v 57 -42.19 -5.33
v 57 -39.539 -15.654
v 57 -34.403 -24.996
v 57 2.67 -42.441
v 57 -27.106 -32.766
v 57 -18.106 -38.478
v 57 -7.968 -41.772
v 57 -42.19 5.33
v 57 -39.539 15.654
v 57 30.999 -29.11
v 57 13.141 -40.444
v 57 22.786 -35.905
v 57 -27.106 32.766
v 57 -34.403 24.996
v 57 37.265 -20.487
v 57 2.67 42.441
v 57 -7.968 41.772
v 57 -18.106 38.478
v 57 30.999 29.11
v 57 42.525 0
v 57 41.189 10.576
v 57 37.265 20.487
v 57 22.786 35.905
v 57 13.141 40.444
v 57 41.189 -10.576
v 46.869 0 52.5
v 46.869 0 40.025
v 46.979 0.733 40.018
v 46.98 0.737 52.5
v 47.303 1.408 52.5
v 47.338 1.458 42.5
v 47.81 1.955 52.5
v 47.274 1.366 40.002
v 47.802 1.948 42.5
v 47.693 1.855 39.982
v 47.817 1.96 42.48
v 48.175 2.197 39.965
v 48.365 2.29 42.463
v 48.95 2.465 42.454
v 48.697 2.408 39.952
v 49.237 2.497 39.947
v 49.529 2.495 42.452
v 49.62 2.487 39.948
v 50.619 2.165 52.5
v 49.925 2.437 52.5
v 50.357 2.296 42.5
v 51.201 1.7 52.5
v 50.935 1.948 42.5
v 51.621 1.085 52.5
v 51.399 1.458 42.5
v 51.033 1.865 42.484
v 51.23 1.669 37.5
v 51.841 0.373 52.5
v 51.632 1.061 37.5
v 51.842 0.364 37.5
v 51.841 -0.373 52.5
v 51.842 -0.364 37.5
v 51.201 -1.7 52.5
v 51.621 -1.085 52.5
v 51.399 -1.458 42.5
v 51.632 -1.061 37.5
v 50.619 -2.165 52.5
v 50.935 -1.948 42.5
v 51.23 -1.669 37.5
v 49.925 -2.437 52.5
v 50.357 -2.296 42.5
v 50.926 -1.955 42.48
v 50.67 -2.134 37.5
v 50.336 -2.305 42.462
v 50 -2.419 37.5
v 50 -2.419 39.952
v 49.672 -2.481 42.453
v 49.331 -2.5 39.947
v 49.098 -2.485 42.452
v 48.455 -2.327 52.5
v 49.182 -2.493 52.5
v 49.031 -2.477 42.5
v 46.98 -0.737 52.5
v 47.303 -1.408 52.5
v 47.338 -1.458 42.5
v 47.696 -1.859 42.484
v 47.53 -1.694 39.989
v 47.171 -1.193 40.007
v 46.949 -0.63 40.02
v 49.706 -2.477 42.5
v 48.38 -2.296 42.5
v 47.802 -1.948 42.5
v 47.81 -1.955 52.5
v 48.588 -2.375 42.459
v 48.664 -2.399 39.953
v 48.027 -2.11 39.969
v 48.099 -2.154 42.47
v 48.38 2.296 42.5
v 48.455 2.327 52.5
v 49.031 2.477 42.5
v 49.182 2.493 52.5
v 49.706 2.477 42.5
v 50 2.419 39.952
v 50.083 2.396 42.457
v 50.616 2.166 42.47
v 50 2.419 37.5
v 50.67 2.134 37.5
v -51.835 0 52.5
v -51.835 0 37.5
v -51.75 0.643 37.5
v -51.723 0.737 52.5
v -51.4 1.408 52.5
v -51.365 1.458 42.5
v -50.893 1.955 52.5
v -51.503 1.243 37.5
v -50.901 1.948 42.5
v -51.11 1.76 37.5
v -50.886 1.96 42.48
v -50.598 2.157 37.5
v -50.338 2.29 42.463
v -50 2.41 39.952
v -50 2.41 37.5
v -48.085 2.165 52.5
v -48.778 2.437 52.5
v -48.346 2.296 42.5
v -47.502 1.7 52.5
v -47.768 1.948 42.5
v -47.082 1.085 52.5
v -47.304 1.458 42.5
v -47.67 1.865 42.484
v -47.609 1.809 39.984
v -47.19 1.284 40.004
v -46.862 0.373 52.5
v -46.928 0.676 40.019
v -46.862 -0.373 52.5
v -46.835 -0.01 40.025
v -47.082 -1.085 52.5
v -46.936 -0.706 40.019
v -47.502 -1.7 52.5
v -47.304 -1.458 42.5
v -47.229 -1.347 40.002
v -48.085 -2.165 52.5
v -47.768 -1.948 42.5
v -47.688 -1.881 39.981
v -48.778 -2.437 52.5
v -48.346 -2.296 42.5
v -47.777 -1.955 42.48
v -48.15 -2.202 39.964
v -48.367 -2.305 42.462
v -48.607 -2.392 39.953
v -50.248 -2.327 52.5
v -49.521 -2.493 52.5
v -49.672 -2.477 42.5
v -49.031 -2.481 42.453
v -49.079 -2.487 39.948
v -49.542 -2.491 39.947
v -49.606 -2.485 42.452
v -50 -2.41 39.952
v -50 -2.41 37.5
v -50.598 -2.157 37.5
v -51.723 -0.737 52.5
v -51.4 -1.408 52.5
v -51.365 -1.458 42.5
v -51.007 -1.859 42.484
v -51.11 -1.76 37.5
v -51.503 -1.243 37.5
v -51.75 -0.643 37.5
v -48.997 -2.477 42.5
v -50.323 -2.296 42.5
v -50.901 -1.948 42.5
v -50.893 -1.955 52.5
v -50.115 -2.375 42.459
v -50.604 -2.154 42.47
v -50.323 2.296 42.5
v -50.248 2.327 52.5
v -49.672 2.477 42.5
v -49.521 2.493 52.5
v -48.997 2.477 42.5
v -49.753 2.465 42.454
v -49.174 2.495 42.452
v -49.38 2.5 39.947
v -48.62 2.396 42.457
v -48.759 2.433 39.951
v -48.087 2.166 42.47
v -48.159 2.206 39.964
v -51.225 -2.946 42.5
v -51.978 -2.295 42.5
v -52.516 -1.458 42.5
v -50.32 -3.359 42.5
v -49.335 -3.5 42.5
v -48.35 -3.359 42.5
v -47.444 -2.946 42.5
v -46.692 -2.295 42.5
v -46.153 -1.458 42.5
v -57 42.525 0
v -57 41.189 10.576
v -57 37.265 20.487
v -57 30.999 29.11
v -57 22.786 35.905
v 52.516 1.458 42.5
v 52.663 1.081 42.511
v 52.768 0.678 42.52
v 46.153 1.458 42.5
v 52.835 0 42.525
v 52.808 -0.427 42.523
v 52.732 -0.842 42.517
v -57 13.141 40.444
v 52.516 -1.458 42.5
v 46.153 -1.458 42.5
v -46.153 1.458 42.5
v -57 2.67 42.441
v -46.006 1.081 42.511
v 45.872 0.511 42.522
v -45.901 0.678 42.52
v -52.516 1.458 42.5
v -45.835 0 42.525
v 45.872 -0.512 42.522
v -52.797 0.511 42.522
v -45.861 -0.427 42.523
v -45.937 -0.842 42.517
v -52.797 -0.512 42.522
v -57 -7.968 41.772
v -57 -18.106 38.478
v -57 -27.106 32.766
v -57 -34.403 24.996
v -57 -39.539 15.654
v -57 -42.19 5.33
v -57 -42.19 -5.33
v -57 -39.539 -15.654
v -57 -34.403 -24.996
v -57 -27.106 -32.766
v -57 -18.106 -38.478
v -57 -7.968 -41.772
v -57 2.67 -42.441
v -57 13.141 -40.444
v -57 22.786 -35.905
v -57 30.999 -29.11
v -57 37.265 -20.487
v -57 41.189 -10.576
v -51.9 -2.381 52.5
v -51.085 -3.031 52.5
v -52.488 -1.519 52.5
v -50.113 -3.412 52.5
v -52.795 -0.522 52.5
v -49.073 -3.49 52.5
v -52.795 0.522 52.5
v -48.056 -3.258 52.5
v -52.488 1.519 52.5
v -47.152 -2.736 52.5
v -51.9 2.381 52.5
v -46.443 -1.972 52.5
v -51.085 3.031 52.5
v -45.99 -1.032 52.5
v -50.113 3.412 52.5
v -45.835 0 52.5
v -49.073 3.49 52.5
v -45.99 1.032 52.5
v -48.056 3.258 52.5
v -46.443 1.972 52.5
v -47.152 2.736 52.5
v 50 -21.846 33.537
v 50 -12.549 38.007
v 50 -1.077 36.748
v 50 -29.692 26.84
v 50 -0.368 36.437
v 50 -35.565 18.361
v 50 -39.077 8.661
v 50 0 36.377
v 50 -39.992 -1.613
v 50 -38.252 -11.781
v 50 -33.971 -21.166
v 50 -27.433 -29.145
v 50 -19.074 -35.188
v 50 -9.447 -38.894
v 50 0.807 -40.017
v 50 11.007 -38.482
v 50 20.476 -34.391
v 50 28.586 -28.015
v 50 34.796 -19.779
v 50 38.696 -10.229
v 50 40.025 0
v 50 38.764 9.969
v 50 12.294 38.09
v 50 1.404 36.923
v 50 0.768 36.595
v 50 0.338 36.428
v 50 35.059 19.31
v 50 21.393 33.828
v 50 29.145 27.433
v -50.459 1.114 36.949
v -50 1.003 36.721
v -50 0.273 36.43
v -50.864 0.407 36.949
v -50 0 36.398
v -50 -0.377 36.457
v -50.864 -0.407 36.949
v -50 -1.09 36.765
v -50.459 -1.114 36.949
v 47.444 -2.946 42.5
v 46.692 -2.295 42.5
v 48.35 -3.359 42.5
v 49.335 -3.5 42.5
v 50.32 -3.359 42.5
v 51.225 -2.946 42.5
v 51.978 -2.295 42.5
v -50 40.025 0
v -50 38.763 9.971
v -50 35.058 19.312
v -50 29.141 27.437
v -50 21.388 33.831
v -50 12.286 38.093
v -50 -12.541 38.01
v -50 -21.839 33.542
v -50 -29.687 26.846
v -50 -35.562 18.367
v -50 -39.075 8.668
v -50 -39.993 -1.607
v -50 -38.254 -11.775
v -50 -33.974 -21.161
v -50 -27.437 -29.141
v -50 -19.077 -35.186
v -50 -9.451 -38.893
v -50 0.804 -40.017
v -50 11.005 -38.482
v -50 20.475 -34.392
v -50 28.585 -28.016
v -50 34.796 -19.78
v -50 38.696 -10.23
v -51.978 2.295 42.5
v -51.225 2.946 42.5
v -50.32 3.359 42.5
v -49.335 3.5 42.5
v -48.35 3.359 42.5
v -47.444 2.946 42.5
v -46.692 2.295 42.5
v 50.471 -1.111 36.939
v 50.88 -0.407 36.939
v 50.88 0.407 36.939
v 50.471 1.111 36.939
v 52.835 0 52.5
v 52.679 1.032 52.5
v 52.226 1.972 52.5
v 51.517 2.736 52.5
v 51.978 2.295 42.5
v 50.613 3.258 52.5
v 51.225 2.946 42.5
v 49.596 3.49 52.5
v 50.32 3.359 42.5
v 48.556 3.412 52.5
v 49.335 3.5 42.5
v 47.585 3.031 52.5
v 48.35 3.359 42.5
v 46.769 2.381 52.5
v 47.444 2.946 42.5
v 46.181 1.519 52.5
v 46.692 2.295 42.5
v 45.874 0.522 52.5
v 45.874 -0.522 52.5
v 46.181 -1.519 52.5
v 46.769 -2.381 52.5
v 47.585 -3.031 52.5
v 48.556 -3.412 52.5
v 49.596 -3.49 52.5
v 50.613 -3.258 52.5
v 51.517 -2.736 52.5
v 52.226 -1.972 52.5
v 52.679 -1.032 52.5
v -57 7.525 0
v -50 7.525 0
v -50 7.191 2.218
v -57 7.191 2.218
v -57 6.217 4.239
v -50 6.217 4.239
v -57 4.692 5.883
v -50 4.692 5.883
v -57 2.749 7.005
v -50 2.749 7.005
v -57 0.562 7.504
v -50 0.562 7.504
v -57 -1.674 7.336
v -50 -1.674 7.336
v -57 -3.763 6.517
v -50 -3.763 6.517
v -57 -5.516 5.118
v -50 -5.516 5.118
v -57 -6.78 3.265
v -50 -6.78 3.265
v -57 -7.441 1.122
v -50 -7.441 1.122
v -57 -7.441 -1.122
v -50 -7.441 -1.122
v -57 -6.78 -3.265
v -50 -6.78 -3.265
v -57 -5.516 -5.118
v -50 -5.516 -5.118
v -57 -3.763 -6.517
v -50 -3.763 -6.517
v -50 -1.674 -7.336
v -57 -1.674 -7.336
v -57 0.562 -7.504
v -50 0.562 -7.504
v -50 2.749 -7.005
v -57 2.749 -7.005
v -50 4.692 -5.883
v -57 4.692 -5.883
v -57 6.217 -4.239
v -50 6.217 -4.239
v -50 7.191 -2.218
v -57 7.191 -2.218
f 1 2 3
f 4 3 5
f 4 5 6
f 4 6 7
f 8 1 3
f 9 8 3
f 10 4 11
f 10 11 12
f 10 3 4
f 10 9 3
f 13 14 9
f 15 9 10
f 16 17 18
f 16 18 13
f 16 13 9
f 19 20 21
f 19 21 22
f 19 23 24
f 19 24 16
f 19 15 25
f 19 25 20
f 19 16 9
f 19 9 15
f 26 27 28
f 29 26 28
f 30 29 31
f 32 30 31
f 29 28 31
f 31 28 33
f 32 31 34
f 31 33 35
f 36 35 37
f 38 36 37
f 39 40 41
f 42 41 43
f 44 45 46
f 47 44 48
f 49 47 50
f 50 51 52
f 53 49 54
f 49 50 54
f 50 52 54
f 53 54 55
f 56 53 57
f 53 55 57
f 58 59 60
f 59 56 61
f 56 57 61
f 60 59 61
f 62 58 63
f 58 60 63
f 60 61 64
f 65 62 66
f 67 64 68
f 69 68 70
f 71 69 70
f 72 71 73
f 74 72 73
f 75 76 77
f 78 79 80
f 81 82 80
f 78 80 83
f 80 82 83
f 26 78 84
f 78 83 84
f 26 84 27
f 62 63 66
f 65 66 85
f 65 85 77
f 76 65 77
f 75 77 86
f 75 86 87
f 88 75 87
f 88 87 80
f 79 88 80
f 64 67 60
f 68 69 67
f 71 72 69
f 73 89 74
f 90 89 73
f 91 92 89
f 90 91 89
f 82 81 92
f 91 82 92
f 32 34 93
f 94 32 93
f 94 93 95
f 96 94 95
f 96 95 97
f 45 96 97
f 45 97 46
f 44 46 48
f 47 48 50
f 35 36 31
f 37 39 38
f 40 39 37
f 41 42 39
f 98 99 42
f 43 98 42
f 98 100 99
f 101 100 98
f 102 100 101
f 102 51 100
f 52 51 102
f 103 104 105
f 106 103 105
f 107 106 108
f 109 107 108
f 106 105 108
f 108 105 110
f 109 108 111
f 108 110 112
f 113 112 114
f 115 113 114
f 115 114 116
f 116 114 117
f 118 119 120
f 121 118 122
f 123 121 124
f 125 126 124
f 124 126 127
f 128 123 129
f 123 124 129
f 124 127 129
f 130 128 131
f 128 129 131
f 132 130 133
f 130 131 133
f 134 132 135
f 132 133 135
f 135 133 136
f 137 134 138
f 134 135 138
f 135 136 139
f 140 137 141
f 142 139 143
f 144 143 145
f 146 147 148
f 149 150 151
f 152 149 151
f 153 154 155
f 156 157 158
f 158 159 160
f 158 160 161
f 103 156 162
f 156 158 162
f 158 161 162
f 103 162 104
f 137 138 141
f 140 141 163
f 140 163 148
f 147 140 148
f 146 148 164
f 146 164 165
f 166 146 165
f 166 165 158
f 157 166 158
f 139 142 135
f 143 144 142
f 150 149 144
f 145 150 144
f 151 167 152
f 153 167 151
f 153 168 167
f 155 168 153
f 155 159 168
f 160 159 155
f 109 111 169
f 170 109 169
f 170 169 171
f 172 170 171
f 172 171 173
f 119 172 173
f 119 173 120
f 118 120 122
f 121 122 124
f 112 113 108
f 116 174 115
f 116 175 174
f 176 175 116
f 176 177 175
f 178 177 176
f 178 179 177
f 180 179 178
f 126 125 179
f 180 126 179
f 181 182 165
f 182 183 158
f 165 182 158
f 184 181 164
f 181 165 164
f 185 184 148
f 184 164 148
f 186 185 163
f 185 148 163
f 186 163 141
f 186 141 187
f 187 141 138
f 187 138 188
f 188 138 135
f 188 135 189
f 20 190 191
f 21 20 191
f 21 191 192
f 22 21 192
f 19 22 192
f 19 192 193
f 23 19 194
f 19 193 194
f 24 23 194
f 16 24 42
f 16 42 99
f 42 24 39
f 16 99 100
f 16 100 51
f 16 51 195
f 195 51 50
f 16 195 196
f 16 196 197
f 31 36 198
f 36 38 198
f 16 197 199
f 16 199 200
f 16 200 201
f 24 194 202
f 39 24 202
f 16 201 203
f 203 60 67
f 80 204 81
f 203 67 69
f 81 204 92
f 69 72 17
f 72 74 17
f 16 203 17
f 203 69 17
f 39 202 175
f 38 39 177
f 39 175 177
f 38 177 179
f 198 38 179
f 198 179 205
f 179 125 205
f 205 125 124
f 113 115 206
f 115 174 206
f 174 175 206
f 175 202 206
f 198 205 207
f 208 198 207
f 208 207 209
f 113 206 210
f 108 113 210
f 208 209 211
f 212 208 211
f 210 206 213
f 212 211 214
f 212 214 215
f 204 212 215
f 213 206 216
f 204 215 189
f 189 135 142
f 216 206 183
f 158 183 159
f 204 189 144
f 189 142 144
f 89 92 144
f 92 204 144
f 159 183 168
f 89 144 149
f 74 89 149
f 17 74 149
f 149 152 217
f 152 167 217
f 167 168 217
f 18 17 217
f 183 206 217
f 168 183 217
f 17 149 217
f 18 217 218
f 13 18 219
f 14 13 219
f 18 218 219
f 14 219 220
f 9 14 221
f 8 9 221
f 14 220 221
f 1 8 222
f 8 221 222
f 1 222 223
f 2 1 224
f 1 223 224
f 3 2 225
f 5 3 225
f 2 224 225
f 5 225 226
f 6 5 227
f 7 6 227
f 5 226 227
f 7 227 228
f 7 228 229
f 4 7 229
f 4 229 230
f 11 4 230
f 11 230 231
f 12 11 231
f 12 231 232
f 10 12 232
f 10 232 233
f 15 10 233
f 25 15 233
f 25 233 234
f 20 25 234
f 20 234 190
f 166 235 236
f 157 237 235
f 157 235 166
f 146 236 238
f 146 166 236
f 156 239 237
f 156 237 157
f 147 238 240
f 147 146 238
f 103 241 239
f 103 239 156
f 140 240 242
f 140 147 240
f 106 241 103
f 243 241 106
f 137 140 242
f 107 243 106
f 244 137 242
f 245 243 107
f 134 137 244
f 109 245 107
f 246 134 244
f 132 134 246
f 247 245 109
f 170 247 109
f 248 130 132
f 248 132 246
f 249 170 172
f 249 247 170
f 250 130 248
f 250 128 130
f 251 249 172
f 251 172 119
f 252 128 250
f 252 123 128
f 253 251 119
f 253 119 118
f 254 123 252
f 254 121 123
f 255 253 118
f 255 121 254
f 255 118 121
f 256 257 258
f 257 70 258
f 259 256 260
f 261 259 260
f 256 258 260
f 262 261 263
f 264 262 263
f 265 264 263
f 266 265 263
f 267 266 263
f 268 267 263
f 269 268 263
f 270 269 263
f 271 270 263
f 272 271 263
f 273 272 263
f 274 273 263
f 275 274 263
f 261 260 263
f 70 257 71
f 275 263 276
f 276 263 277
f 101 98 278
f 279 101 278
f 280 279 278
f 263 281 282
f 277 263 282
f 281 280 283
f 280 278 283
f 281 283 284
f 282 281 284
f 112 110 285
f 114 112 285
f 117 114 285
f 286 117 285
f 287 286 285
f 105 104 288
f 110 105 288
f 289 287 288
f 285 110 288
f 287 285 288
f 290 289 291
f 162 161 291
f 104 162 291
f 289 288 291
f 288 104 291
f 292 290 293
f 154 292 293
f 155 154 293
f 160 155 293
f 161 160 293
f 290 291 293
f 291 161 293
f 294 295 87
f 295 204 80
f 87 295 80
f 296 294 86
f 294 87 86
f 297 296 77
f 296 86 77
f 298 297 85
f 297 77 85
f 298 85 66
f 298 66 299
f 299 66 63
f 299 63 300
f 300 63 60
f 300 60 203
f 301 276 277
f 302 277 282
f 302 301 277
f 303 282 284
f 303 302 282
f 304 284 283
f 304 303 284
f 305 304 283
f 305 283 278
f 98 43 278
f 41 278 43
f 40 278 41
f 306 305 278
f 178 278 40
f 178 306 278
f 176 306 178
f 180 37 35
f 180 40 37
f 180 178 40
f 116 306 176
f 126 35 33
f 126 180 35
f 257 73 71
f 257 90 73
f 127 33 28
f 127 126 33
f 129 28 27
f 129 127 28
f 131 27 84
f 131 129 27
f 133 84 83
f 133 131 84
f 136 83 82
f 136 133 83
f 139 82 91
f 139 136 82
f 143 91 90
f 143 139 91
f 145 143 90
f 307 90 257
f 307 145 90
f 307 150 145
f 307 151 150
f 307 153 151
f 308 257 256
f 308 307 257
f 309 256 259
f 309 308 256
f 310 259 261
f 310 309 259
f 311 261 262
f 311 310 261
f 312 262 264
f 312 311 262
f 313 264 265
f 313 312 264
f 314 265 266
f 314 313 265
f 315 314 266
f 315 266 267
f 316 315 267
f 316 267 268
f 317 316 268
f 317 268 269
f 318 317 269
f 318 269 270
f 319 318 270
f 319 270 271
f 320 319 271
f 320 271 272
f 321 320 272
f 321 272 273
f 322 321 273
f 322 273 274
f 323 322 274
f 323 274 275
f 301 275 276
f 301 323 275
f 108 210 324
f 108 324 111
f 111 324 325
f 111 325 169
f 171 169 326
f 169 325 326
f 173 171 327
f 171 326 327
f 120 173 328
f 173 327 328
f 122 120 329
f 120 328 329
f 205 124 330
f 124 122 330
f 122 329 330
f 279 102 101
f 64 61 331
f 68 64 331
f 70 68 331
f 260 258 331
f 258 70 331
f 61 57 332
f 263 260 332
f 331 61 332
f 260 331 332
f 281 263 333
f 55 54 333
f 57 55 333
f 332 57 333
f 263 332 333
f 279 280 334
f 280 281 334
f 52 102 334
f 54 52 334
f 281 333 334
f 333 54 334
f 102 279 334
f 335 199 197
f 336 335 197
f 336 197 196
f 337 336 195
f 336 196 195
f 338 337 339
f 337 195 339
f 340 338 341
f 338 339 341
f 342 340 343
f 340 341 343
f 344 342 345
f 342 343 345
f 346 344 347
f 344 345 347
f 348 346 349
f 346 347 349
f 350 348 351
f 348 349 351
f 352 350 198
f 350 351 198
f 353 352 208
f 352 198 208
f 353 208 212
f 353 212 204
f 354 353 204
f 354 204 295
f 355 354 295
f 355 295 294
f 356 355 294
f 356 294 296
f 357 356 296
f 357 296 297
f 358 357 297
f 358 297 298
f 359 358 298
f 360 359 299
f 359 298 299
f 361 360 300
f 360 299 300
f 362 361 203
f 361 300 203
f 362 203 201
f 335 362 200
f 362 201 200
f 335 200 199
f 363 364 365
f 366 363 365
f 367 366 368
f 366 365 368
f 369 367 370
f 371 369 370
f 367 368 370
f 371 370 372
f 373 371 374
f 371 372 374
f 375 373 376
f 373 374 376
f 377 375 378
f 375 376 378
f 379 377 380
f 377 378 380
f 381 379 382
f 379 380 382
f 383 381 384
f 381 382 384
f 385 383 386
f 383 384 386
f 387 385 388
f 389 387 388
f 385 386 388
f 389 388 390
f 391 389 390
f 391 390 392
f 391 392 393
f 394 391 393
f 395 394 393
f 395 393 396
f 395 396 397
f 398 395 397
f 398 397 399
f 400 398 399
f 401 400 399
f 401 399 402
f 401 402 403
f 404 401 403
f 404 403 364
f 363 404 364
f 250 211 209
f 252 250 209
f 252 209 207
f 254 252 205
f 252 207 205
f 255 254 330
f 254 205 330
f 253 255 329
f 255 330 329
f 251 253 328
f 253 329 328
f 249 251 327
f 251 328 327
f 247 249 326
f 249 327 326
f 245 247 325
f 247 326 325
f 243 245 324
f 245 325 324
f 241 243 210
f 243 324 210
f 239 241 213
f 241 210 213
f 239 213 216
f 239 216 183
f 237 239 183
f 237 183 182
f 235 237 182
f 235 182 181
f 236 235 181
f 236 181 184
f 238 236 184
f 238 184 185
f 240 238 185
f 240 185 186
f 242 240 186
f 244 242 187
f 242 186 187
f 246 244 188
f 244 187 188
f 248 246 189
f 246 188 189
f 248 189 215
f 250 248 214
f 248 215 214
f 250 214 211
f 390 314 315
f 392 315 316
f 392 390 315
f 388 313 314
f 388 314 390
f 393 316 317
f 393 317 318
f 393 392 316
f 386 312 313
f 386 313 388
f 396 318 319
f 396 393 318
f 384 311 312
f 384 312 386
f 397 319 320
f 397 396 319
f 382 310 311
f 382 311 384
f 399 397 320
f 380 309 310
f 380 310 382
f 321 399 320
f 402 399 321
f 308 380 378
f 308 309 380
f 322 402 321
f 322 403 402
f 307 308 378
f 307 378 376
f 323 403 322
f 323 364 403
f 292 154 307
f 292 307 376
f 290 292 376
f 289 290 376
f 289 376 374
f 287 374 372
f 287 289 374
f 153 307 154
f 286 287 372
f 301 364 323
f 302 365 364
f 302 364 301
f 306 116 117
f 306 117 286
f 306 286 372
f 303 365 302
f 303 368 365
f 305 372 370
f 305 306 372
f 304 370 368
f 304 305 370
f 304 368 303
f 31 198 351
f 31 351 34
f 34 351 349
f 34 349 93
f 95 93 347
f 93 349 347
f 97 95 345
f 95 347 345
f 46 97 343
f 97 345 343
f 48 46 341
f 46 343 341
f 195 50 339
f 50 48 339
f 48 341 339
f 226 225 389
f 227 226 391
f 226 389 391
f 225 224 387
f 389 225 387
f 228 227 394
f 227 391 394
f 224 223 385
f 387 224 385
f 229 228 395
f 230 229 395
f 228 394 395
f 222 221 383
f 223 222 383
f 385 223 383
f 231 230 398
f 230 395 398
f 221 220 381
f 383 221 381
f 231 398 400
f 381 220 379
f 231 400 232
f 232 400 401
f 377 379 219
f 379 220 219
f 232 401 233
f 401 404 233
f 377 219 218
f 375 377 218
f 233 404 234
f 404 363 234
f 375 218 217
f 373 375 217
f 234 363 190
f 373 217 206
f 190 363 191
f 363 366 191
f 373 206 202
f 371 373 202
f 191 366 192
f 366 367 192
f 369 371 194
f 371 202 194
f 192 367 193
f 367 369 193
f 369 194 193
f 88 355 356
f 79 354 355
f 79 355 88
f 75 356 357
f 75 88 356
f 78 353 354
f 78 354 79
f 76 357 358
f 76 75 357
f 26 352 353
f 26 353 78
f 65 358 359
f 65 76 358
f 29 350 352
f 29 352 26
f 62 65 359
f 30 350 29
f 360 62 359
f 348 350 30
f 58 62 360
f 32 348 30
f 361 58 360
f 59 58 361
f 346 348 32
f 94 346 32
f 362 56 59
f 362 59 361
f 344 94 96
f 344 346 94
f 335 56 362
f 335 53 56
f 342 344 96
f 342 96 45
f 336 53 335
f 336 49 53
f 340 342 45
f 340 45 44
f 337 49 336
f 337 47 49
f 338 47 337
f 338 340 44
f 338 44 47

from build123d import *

# Parameters (mm, degrees)
F0_R      = 42.525
F0_R_2    = 40.025
F1_DEPTH  = 50
F2_R      = 42.525
F3_DEPTH  = 7
F6_D      = 15.05
F6_DEPTH  = 12
F6_TIP    = 4.5214761582
F8_R      = 3.5
F9_DEPTH  = 10
F11_D     = 5
F11_DEPTH = 15
F11_TIP   = 1.5021515476


with BuildPart() as f1:
    # F0 (on Right) → F1 (new body, symmetric)
    with BuildSketch(Plane.YZ):
        Circle(F0_R)
        Circle(F0_R_2, mode=Mode.SUBTRACT)
    extrude(amount=F1_DEPTH, both=True)

    # F4: F3 across plane


with BuildPart() as f3:
    # F2 (on face) → F3 (new body)
    with BuildSketch(Plane.YZ.offset(50)):
        Circle(F2_R)
    extrude(amount=F3_DEPTH)


with BuildPart() as f1_1:
    add(f1.part)
    add(f3.part.mirror(Plane.YZ))

    # F6
    with Locations(Plane(origin=(-57, 0, 0), x_dir=(0, -1, 0), z_dir=(-1, 0, 0))):
        with Locations((0, 0)):
            Hole(F6_D / 2, depth=F6_DEPTH)
            with Locations((0, 0, -(F6_DEPTH + F6_TIP / 2))):  # 118° drill point
                Cone(0, F6_D / 2, F6_TIP, mode=Mode.SUBTRACT)


    add(f3.part)  # F9 merges F3
    # F8 (on offset) → F9 (join)
    with BuildSketch(Plane.XY.offset(42.5)):
        with Locations((-49.3345595896, 0)):
            Circle(F8_R)
        with Locations((49.3345595896, 0)):
            Circle(F8_R)
    extrude(amount=F9_DEPTH)

    # F11
    with Locations(Plane.XY.offset(52.5)):
        with Locations((-49.3345595896, 0), (49.3685118854, 0)):
            Hole(F11_D / 2, depth=F11_DEPTH)
            with Locations((0, 0, -(F11_DEPTH + F11_TIP / 2))):  # 118° drill point
                Cone(0, F11_D / 2, F11_TIP, mode=Mode.SUBTRACT)


solid = f1_1.part
